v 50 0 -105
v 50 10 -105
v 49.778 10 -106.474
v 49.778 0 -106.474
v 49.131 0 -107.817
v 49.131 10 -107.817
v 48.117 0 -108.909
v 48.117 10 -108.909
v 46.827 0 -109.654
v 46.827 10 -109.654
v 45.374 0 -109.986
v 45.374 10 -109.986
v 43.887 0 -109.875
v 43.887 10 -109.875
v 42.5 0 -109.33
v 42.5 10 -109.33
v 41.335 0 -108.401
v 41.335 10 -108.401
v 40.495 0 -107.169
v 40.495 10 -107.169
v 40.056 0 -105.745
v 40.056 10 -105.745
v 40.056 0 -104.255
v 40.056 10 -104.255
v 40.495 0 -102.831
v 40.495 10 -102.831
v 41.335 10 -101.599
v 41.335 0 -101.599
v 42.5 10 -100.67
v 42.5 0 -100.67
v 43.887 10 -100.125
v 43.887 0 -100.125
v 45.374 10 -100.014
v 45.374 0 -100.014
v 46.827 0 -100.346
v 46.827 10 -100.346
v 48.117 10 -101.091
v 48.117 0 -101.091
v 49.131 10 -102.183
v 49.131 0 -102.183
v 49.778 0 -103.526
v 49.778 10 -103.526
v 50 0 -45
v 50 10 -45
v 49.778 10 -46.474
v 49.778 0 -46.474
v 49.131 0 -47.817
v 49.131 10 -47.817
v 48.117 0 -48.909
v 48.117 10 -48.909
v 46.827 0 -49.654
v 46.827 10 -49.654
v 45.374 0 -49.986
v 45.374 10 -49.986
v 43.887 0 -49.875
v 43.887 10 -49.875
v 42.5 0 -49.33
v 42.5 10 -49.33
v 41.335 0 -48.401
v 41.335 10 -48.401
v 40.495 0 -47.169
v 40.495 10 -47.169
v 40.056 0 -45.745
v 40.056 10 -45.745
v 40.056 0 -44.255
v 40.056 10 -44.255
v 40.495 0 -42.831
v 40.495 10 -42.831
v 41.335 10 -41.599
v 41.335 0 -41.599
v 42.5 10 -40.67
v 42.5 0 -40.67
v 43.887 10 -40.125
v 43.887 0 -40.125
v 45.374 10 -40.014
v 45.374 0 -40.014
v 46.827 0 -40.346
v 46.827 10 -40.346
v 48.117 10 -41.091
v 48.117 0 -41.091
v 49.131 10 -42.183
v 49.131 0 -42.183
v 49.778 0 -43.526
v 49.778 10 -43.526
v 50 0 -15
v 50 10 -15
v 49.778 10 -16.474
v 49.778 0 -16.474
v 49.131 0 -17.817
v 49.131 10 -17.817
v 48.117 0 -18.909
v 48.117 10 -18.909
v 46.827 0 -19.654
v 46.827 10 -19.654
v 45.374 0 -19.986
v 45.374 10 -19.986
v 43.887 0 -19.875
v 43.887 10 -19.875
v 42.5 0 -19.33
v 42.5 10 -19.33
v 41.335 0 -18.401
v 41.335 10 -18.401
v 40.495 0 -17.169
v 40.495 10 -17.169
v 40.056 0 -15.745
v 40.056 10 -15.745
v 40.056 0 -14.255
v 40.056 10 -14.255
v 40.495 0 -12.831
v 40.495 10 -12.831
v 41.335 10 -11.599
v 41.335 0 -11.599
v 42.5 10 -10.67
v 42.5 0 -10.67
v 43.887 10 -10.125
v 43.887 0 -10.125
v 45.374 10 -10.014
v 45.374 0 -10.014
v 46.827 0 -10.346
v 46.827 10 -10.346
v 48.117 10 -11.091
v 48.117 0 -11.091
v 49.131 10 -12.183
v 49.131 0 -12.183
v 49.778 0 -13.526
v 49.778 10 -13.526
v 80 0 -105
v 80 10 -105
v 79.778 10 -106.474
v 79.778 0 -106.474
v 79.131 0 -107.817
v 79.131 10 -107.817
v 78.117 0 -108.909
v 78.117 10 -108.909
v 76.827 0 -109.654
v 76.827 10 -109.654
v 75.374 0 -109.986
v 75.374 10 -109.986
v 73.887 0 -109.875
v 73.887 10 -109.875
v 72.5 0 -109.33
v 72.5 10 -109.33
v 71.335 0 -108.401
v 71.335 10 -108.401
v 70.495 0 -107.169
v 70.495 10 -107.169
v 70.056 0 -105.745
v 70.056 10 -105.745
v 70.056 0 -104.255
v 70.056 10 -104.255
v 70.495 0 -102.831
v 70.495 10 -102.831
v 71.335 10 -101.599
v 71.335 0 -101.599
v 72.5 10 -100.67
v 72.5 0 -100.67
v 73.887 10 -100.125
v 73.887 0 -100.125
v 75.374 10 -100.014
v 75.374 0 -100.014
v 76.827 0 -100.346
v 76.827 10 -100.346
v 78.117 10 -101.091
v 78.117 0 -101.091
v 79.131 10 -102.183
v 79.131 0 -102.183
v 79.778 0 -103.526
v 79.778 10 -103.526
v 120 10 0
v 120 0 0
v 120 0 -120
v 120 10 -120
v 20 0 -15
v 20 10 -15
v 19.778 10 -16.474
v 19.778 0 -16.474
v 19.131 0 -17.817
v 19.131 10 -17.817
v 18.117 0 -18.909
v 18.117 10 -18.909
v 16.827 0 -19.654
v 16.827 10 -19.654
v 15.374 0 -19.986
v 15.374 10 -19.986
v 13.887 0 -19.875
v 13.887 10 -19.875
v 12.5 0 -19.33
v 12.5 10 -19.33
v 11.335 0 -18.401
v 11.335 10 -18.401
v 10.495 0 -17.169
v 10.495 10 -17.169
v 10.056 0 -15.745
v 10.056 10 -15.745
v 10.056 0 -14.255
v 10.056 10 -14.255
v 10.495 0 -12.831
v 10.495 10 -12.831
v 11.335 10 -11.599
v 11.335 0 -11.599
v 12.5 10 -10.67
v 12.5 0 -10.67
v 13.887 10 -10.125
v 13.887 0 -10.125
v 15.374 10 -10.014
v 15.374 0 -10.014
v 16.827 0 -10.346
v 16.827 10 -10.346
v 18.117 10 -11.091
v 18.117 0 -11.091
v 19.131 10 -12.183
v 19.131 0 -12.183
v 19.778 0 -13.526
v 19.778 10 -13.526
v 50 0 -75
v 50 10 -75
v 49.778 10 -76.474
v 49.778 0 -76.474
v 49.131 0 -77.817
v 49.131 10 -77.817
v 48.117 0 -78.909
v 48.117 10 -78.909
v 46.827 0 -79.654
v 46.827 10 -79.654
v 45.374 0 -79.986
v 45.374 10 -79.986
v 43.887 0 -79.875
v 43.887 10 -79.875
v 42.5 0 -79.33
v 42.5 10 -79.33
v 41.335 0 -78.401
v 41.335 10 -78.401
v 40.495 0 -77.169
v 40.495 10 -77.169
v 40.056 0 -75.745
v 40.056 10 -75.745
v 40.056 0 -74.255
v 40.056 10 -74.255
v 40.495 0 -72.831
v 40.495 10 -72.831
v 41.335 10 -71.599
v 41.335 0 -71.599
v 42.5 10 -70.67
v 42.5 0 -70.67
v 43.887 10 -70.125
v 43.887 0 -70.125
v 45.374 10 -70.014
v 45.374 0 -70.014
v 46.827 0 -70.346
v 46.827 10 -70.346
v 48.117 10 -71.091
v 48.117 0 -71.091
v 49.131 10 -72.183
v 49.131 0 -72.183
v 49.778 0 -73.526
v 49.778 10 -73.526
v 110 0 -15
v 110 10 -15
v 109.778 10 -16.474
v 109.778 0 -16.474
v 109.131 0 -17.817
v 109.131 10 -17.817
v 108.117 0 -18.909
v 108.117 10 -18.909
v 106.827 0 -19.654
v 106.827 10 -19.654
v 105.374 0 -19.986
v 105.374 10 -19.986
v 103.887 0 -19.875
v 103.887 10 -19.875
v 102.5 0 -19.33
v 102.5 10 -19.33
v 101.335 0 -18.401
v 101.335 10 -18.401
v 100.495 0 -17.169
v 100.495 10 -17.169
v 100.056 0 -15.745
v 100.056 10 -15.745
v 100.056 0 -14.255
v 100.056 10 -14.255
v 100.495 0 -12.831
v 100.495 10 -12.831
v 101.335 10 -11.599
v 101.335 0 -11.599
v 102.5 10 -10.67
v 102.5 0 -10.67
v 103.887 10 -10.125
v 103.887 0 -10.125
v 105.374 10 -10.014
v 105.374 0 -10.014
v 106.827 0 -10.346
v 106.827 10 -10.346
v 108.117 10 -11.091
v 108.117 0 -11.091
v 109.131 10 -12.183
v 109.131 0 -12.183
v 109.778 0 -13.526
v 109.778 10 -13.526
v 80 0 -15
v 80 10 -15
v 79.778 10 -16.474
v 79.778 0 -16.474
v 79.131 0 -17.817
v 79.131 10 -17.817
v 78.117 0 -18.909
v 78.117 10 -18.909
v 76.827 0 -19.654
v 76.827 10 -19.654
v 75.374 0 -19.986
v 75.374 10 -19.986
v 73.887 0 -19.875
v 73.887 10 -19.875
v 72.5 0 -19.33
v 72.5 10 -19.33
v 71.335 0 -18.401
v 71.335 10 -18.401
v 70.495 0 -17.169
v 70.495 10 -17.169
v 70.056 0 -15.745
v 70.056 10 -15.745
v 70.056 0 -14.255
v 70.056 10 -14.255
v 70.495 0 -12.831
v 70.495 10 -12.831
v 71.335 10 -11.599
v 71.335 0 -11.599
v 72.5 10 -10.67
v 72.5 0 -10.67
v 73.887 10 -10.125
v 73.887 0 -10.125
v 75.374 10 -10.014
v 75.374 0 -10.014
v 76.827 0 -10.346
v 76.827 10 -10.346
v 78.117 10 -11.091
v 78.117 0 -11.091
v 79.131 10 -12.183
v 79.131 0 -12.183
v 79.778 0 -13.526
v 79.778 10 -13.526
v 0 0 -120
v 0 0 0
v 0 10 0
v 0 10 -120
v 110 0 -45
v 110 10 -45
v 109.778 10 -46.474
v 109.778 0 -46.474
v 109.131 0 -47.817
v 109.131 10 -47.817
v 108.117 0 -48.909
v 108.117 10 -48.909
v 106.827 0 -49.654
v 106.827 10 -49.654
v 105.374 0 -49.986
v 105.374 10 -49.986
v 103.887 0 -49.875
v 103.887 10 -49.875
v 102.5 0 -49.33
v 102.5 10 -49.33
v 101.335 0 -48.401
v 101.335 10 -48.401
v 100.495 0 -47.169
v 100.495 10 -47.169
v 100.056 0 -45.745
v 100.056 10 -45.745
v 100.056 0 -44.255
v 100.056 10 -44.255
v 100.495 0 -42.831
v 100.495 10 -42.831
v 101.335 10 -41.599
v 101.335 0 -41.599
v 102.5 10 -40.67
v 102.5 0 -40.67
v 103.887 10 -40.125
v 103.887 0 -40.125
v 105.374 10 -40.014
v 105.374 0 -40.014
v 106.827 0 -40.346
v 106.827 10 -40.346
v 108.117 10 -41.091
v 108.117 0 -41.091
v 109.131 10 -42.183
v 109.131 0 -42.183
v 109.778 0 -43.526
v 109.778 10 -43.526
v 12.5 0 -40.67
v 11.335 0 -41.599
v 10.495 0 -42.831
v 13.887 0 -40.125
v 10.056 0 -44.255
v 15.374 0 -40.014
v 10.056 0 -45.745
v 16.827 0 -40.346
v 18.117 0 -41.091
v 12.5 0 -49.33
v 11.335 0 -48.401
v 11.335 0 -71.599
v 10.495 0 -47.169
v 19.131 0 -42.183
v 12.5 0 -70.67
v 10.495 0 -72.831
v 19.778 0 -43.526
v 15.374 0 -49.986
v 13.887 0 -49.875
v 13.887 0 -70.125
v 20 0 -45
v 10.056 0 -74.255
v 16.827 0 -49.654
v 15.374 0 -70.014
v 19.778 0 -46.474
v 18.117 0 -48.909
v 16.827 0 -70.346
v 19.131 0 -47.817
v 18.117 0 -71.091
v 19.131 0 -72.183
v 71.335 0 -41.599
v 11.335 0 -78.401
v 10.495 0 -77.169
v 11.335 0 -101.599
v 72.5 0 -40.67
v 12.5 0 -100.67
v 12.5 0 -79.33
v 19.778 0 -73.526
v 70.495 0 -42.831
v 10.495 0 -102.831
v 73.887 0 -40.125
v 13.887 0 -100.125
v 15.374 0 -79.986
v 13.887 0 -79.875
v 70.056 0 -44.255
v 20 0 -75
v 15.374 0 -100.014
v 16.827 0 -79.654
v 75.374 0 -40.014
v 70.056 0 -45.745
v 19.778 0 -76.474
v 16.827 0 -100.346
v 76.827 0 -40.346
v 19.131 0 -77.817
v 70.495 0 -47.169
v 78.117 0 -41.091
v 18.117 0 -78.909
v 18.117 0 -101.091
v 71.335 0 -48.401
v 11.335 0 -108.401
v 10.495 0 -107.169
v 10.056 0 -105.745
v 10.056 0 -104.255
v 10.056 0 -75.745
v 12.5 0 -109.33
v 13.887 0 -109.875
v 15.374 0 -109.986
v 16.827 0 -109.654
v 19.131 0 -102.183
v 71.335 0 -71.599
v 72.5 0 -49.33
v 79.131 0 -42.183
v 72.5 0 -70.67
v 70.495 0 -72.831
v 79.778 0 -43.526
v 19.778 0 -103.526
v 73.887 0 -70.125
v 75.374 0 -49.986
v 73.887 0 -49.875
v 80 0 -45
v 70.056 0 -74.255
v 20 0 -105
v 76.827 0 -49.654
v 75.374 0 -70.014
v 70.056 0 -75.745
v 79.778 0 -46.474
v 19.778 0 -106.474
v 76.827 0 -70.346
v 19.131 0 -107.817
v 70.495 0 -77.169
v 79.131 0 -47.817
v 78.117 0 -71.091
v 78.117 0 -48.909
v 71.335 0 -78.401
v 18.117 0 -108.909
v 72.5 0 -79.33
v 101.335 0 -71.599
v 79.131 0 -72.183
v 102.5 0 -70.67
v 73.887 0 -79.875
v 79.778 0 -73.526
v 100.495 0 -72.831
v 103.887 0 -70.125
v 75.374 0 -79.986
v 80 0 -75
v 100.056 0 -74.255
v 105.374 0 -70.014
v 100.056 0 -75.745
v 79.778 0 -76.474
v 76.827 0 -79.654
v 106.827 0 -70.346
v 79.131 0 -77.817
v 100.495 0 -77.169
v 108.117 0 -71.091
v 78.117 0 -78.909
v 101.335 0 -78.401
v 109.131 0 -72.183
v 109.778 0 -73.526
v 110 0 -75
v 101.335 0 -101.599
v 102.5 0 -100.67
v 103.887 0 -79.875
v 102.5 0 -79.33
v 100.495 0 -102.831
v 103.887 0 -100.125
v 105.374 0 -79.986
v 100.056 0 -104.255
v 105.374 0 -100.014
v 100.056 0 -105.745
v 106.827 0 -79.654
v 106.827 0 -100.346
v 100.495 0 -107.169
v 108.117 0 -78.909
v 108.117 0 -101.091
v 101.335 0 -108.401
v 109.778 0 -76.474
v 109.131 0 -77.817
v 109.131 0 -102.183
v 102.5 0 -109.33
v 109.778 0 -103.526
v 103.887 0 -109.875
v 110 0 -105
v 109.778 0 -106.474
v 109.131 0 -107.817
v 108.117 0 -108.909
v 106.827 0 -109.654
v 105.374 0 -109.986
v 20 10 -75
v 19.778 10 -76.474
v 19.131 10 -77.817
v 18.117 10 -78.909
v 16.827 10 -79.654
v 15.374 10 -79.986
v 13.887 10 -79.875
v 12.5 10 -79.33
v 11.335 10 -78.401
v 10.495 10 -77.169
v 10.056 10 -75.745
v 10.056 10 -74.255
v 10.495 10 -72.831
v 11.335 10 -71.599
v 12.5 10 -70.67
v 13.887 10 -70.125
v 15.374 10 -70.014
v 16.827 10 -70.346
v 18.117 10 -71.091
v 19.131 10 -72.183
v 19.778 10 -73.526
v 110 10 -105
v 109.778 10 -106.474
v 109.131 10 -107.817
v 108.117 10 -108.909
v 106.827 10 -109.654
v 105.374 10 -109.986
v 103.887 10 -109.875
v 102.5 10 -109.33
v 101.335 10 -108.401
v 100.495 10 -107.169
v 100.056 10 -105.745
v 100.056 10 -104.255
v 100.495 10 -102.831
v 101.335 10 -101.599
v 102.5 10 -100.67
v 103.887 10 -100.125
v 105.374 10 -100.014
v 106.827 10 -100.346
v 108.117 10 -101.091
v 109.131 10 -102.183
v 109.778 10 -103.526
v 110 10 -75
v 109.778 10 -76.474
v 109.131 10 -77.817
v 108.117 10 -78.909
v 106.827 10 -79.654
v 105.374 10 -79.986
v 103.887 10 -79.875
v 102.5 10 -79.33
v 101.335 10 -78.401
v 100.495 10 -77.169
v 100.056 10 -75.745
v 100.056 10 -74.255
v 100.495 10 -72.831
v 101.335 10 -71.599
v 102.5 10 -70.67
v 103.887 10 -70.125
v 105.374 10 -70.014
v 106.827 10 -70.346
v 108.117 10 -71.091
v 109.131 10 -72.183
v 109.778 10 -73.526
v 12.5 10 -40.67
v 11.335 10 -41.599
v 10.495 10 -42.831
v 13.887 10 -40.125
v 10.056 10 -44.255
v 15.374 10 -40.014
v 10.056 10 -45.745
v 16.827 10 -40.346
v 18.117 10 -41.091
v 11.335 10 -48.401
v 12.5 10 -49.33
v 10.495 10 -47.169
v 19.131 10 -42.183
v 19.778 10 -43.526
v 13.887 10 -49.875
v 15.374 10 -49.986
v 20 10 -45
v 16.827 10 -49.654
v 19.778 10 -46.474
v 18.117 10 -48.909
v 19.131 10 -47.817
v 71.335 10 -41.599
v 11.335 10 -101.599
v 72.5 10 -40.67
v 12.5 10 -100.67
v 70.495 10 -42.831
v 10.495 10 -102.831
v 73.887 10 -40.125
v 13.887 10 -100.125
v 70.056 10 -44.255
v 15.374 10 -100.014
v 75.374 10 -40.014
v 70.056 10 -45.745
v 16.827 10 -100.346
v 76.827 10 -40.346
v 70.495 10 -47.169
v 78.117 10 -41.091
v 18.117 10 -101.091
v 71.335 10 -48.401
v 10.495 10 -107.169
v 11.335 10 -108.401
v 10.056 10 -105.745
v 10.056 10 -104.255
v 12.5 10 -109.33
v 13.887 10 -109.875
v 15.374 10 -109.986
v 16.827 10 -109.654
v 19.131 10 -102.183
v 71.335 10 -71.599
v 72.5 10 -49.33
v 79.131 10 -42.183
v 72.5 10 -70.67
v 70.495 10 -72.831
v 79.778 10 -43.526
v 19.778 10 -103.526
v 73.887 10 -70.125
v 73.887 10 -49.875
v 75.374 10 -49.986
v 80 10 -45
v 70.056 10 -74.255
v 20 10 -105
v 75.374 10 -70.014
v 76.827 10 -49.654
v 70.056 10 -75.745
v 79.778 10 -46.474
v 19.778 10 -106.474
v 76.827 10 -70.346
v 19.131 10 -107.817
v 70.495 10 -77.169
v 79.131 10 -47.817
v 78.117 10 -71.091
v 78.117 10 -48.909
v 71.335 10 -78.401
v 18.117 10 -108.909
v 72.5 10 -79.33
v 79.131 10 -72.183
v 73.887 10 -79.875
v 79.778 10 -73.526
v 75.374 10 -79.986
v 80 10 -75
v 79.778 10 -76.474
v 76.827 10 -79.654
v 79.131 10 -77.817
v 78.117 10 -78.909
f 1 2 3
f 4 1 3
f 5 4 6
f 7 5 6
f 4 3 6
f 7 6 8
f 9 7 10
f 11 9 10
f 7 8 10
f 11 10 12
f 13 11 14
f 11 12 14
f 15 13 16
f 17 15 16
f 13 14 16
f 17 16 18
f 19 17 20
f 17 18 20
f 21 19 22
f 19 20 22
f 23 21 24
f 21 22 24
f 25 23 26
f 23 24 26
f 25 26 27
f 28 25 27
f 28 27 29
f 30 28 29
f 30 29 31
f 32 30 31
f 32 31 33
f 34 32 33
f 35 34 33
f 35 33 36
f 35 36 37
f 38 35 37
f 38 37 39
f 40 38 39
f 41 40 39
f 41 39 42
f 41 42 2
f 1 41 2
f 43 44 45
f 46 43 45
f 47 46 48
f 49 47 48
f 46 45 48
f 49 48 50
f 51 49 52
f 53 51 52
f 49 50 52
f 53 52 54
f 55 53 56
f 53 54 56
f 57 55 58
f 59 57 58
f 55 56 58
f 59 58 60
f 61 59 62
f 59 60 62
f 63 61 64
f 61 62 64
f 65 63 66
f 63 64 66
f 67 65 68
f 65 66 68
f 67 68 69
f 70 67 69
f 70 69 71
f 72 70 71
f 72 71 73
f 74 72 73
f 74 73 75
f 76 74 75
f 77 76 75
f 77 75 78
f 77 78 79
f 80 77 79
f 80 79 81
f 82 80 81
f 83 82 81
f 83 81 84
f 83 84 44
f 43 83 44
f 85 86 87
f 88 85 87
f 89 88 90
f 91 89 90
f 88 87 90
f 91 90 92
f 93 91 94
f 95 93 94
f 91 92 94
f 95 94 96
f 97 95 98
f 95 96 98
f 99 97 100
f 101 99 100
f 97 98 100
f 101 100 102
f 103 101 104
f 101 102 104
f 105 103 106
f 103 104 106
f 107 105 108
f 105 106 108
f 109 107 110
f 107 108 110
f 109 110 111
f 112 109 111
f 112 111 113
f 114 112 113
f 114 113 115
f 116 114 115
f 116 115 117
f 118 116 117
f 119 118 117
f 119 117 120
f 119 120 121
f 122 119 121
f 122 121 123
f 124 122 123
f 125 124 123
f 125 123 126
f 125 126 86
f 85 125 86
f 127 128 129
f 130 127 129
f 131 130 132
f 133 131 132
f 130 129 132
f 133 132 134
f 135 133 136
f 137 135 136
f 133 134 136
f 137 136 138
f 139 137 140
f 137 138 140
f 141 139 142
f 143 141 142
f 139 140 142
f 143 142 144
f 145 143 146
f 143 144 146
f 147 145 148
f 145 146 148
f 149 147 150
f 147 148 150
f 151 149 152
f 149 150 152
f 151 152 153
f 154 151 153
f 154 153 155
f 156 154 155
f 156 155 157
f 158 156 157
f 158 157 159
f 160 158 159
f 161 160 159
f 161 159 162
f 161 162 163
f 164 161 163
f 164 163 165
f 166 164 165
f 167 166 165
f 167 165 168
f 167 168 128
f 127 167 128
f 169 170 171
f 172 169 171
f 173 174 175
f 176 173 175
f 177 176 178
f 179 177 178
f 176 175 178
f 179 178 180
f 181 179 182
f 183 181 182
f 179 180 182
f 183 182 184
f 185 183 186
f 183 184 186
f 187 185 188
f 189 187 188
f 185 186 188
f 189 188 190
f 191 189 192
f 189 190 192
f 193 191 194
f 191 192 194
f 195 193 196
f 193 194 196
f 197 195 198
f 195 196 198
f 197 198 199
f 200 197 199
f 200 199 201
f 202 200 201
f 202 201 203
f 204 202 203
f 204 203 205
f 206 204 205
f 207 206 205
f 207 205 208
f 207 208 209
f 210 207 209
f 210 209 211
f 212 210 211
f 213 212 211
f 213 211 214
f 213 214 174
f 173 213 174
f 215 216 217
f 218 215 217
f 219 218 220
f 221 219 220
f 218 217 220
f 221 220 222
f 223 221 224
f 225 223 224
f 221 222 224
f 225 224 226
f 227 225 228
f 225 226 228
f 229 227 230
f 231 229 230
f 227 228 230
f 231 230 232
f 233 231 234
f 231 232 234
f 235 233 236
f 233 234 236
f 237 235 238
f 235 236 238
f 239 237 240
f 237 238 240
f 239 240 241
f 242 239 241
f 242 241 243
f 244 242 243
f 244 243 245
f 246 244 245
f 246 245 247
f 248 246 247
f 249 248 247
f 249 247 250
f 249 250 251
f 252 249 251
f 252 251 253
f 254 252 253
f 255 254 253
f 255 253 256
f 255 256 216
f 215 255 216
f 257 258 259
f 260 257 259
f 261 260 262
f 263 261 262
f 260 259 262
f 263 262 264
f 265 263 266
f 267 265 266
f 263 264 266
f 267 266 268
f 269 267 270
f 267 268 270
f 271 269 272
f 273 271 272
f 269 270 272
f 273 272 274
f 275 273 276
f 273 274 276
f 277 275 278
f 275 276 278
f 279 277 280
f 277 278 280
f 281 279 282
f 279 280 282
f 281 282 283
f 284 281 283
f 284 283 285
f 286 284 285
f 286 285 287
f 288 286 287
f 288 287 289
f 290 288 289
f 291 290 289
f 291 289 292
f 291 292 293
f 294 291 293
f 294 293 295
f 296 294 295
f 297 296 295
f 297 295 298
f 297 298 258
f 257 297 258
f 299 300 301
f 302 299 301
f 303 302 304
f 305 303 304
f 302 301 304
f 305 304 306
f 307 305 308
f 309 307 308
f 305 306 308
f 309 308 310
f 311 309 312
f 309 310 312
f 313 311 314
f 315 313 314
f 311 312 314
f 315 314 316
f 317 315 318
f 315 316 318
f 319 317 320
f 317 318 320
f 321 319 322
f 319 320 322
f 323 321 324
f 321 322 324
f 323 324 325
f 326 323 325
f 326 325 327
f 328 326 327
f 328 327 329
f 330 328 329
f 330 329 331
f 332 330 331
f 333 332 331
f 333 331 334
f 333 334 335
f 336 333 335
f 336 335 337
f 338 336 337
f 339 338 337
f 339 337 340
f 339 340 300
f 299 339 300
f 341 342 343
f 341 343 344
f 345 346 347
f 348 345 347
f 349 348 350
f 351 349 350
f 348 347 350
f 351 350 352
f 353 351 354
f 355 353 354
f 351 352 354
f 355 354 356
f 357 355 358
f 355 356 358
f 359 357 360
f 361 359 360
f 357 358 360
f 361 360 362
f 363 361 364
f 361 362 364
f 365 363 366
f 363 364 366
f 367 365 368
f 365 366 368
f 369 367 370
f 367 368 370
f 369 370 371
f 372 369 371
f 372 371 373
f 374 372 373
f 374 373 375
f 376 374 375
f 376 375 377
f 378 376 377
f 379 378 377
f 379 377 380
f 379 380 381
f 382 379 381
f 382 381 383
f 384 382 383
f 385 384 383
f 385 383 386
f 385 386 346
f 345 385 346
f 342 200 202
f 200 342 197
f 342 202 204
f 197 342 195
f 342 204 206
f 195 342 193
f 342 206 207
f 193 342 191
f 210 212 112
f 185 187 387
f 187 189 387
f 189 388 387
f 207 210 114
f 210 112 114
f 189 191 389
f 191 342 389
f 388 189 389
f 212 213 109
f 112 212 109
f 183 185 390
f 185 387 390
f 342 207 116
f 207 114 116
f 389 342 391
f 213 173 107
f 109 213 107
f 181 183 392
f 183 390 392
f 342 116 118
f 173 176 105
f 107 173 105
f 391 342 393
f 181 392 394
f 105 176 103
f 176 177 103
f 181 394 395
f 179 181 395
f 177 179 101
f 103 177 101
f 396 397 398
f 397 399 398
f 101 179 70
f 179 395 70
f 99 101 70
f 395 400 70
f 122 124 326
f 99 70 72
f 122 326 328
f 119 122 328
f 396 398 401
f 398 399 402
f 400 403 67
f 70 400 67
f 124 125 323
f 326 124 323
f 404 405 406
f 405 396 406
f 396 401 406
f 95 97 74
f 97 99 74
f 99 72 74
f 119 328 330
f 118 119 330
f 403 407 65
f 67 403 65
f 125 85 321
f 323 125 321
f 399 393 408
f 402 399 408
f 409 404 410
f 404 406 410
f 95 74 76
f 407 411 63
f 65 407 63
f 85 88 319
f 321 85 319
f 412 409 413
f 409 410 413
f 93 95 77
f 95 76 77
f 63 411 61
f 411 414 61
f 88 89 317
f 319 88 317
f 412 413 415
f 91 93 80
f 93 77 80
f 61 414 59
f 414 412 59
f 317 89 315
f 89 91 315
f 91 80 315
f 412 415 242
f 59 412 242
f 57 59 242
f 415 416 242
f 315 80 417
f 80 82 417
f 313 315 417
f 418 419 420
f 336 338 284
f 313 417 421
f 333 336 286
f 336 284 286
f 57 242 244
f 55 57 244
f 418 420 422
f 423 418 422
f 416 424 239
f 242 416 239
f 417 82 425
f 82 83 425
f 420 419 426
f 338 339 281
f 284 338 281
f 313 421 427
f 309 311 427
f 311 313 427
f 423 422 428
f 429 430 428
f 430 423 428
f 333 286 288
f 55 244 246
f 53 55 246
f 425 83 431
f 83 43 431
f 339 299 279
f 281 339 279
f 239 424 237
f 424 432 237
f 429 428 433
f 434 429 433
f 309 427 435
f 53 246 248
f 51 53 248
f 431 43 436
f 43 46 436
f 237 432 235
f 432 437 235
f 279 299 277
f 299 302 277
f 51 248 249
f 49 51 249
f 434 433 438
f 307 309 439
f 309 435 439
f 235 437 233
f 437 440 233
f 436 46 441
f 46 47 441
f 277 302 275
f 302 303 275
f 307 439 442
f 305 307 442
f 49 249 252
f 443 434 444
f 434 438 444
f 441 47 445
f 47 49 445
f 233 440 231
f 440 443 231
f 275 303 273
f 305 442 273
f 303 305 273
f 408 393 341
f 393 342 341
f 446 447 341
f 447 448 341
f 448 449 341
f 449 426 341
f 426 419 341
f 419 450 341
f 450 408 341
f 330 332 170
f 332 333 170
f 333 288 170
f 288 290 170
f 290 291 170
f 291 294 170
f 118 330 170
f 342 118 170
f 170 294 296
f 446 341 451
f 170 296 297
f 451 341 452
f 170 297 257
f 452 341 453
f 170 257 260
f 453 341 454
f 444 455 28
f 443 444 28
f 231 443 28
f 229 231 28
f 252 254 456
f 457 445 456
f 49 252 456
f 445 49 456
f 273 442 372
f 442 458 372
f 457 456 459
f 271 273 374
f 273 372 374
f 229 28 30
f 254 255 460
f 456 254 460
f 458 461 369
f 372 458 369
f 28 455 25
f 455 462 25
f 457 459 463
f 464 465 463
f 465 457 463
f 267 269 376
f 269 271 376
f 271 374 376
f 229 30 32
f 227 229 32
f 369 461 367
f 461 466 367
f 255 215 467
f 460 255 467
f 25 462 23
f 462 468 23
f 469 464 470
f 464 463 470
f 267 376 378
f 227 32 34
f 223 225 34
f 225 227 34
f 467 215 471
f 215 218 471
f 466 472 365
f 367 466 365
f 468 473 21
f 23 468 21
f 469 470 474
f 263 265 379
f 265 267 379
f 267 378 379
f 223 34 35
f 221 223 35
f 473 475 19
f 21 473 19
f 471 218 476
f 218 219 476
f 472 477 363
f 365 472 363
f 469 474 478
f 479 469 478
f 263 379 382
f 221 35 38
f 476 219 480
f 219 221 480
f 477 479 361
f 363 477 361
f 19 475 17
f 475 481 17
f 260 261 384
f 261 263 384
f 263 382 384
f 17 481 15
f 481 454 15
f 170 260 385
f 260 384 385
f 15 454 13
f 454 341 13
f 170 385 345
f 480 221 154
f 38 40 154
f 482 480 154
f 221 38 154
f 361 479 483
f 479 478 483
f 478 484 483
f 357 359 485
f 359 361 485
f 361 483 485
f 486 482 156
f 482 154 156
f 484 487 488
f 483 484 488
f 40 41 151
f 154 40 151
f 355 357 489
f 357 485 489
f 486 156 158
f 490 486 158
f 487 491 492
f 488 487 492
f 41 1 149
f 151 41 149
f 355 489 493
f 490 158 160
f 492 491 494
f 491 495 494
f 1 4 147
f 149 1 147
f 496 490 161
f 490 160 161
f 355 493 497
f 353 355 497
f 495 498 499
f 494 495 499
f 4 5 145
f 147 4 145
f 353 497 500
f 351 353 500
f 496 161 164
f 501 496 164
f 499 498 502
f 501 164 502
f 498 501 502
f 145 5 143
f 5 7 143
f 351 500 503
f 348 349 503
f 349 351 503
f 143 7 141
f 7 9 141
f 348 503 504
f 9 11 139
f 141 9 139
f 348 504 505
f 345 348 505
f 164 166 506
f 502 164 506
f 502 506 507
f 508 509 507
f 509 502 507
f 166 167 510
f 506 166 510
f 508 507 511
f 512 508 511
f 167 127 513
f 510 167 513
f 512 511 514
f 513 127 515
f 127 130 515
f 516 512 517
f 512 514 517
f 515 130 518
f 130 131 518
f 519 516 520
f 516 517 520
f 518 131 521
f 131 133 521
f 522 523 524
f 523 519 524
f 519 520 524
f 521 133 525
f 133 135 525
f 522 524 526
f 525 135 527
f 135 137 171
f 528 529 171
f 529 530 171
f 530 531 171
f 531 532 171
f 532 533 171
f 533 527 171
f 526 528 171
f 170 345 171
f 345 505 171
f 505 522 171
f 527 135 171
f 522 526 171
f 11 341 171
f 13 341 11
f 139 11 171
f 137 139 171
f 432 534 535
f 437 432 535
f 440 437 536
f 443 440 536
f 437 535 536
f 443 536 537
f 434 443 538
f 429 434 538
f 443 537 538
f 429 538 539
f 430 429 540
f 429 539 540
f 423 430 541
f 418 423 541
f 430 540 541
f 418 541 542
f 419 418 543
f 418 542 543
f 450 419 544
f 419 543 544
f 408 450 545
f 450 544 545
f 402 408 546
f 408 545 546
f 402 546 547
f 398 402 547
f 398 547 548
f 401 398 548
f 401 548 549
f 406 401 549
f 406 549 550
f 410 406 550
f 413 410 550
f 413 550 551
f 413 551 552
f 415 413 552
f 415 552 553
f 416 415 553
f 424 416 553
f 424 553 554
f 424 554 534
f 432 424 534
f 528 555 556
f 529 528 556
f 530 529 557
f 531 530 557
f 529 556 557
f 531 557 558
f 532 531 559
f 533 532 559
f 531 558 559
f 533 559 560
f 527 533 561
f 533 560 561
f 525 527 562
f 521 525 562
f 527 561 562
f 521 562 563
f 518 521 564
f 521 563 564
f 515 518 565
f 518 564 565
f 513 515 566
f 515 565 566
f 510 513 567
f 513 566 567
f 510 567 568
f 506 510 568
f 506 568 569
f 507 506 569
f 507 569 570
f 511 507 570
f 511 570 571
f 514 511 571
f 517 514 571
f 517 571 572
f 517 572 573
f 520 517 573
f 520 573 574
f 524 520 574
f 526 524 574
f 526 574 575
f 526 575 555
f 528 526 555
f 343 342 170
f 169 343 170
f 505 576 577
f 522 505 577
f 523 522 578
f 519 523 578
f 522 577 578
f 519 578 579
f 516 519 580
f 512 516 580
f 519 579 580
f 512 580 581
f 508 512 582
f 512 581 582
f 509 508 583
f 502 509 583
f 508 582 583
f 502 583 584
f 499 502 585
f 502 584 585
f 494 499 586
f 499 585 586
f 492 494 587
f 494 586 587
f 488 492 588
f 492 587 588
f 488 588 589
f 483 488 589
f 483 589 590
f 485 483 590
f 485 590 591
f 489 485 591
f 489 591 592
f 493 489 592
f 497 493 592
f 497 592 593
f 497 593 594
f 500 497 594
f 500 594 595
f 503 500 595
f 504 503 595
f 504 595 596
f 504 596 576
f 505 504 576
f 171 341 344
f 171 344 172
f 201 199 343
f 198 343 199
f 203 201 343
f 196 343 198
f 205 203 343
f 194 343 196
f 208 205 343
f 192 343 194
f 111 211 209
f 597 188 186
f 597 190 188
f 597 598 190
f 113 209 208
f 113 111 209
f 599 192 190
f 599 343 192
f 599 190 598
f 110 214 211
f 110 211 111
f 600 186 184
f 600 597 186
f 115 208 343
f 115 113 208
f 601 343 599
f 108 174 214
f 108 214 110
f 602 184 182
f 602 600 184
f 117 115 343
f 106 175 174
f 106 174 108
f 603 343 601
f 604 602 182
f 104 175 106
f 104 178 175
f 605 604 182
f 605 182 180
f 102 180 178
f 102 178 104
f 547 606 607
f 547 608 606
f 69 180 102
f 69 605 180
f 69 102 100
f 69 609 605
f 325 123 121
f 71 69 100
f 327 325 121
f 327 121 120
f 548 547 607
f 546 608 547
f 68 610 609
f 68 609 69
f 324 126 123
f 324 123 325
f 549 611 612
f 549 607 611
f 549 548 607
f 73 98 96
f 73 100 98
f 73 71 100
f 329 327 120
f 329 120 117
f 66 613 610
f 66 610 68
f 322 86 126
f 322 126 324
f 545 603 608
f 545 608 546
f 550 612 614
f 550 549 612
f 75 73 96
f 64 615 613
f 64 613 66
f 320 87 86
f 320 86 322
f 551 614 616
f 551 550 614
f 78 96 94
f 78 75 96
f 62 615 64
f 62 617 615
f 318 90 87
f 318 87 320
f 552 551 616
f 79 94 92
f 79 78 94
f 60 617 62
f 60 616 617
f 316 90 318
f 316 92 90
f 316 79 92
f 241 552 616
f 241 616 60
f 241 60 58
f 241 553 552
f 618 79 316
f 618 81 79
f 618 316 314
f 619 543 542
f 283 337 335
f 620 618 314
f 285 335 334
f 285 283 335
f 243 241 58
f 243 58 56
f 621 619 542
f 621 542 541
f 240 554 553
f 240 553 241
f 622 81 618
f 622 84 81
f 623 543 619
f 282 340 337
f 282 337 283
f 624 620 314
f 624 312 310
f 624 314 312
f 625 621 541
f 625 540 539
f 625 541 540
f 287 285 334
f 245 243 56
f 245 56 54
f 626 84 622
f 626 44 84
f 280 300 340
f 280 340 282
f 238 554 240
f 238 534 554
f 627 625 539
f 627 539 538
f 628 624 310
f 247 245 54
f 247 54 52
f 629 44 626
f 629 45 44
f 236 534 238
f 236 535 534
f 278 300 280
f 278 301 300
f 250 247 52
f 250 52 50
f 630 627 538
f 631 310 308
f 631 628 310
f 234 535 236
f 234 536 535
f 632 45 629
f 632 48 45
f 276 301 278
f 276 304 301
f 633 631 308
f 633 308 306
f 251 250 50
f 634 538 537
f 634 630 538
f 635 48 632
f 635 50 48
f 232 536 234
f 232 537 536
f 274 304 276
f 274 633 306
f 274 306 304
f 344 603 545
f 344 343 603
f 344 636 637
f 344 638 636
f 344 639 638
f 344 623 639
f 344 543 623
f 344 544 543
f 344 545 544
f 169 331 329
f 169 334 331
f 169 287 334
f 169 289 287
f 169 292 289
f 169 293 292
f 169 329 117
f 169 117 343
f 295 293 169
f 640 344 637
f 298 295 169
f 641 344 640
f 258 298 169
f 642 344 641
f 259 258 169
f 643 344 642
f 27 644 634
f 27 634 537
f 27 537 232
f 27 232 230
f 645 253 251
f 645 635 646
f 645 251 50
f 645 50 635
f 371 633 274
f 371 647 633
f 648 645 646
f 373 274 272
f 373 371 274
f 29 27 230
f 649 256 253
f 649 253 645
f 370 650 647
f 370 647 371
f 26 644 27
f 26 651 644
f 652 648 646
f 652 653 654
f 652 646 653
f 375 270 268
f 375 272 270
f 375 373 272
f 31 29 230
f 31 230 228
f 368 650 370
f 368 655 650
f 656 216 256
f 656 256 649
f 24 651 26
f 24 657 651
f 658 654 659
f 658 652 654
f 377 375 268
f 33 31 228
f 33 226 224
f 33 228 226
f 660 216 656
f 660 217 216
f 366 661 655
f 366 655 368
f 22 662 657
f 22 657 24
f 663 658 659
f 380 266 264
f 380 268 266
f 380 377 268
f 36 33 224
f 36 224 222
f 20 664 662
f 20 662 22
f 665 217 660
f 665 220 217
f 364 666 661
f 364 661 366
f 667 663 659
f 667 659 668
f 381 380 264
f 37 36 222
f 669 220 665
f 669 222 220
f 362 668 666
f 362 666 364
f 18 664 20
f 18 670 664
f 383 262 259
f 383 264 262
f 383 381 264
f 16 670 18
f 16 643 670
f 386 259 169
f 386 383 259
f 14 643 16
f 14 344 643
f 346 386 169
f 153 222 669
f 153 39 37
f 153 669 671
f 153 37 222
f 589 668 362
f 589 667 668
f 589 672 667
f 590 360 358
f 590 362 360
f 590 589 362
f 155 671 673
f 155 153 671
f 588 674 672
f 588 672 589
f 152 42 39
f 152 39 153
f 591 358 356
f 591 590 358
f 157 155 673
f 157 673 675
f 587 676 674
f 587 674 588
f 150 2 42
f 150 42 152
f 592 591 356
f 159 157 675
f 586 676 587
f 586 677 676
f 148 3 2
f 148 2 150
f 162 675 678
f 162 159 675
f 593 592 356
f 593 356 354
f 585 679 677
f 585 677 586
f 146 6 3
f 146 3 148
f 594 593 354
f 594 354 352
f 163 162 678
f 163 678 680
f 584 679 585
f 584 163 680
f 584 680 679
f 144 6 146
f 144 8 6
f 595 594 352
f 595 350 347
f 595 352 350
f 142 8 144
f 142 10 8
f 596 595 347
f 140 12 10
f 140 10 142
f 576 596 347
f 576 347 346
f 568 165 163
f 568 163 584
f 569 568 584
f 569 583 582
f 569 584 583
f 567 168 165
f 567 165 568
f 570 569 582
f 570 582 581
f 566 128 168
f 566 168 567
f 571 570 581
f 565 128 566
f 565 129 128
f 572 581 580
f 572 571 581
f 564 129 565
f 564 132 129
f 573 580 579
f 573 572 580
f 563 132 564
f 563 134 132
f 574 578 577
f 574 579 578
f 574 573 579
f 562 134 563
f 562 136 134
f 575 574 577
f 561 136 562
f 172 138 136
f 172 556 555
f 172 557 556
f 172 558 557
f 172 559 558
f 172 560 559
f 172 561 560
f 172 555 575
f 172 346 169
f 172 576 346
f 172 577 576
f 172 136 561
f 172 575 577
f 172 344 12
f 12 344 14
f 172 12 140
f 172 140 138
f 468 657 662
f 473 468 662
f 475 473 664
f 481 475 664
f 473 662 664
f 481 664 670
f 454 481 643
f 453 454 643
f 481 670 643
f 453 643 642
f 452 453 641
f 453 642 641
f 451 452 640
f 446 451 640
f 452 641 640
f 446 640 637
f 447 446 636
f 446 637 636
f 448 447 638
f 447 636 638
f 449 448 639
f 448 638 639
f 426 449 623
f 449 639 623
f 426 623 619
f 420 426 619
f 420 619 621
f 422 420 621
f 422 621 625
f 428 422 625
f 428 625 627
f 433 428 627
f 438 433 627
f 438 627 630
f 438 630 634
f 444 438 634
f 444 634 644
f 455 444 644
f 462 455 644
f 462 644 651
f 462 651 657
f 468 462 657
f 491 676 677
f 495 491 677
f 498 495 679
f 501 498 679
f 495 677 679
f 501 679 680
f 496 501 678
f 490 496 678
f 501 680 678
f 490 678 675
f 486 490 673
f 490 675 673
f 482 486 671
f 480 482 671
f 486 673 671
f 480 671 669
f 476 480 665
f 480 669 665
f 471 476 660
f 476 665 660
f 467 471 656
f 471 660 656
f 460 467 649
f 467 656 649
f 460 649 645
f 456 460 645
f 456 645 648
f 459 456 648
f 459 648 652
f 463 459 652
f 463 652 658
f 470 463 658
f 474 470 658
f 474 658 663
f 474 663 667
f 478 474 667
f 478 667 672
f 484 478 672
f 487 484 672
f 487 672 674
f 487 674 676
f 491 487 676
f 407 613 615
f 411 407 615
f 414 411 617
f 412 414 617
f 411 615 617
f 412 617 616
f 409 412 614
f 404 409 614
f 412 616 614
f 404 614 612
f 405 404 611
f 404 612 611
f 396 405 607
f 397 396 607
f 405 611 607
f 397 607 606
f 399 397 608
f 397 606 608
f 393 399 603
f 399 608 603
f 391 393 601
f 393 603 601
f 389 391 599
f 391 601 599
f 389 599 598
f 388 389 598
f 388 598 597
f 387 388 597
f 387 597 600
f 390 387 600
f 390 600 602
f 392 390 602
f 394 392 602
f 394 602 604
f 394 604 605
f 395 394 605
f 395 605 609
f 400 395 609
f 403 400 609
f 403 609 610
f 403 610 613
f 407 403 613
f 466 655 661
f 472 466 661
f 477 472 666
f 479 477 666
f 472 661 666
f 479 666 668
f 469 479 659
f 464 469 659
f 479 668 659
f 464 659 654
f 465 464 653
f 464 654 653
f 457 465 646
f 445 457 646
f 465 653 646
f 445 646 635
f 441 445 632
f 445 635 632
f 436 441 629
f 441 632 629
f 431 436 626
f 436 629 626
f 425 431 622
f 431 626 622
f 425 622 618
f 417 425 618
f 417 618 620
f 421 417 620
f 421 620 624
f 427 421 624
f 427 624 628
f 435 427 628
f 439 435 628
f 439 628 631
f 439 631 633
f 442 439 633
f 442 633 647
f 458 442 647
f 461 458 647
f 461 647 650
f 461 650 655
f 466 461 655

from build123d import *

# Parameters (mm, degrees)
SKETCH1_W            = 120
SKETCH1_H            = 120
BOSS_EXTRUDE1_DEPTH  = 10
SKETCH2_R            = 5
CUT_EXTRUDE1_DEPTH   = 11
LPATTERN1_COUNT      = 4
LPATTERN1_PITCH      = 30
LPATTERN1_COUNT_DIR2 = 4
LPATTERN1_PITCH_DIR2 = 30


with BuildPart() as part:
    # Sketch1 → Boss-Extrude1 (new body)
    with BuildSketch(Plane(origin=(0, 0, 0), x_dir=(1, 0, 0), z_dir=(0, 1, 0))):
        with Locations((60, 60)):
            Rectangle(SKETCH1_W, SKETCH1_H)
    extrude(amount=BOSS_EXTRUDE1_DEPTH)

    # Sketch2 → Cut-Extrude1 (cut, through all)
    with BuildSketch(Plane(origin=(0, 10, 0), x_dir=(1, 0, 0), z_dir=(0, 1, 0))):
        with Locations((15, 15)):
            Circle(SKETCH2_R)
    cut_extrude1 = extrude(amount=-CUT_EXTRUDE1_DEPTH, mode=Mode.SUBTRACT)

    # LPattern1: Cut-Extrude1 4 × 4
    with Locations(*[(i * LPATTERN1_PITCH, 0, -j * LPATTERN1_PITCH_DIR2) for i in range(LPATTERN1_COUNT) for j in range(LPATTERN1_COUNT_DIR2) if (i, j) != (0, 0)]):
        add(cut_extrude1, mode=Mode.SUBTRACT)


solid = part.part
